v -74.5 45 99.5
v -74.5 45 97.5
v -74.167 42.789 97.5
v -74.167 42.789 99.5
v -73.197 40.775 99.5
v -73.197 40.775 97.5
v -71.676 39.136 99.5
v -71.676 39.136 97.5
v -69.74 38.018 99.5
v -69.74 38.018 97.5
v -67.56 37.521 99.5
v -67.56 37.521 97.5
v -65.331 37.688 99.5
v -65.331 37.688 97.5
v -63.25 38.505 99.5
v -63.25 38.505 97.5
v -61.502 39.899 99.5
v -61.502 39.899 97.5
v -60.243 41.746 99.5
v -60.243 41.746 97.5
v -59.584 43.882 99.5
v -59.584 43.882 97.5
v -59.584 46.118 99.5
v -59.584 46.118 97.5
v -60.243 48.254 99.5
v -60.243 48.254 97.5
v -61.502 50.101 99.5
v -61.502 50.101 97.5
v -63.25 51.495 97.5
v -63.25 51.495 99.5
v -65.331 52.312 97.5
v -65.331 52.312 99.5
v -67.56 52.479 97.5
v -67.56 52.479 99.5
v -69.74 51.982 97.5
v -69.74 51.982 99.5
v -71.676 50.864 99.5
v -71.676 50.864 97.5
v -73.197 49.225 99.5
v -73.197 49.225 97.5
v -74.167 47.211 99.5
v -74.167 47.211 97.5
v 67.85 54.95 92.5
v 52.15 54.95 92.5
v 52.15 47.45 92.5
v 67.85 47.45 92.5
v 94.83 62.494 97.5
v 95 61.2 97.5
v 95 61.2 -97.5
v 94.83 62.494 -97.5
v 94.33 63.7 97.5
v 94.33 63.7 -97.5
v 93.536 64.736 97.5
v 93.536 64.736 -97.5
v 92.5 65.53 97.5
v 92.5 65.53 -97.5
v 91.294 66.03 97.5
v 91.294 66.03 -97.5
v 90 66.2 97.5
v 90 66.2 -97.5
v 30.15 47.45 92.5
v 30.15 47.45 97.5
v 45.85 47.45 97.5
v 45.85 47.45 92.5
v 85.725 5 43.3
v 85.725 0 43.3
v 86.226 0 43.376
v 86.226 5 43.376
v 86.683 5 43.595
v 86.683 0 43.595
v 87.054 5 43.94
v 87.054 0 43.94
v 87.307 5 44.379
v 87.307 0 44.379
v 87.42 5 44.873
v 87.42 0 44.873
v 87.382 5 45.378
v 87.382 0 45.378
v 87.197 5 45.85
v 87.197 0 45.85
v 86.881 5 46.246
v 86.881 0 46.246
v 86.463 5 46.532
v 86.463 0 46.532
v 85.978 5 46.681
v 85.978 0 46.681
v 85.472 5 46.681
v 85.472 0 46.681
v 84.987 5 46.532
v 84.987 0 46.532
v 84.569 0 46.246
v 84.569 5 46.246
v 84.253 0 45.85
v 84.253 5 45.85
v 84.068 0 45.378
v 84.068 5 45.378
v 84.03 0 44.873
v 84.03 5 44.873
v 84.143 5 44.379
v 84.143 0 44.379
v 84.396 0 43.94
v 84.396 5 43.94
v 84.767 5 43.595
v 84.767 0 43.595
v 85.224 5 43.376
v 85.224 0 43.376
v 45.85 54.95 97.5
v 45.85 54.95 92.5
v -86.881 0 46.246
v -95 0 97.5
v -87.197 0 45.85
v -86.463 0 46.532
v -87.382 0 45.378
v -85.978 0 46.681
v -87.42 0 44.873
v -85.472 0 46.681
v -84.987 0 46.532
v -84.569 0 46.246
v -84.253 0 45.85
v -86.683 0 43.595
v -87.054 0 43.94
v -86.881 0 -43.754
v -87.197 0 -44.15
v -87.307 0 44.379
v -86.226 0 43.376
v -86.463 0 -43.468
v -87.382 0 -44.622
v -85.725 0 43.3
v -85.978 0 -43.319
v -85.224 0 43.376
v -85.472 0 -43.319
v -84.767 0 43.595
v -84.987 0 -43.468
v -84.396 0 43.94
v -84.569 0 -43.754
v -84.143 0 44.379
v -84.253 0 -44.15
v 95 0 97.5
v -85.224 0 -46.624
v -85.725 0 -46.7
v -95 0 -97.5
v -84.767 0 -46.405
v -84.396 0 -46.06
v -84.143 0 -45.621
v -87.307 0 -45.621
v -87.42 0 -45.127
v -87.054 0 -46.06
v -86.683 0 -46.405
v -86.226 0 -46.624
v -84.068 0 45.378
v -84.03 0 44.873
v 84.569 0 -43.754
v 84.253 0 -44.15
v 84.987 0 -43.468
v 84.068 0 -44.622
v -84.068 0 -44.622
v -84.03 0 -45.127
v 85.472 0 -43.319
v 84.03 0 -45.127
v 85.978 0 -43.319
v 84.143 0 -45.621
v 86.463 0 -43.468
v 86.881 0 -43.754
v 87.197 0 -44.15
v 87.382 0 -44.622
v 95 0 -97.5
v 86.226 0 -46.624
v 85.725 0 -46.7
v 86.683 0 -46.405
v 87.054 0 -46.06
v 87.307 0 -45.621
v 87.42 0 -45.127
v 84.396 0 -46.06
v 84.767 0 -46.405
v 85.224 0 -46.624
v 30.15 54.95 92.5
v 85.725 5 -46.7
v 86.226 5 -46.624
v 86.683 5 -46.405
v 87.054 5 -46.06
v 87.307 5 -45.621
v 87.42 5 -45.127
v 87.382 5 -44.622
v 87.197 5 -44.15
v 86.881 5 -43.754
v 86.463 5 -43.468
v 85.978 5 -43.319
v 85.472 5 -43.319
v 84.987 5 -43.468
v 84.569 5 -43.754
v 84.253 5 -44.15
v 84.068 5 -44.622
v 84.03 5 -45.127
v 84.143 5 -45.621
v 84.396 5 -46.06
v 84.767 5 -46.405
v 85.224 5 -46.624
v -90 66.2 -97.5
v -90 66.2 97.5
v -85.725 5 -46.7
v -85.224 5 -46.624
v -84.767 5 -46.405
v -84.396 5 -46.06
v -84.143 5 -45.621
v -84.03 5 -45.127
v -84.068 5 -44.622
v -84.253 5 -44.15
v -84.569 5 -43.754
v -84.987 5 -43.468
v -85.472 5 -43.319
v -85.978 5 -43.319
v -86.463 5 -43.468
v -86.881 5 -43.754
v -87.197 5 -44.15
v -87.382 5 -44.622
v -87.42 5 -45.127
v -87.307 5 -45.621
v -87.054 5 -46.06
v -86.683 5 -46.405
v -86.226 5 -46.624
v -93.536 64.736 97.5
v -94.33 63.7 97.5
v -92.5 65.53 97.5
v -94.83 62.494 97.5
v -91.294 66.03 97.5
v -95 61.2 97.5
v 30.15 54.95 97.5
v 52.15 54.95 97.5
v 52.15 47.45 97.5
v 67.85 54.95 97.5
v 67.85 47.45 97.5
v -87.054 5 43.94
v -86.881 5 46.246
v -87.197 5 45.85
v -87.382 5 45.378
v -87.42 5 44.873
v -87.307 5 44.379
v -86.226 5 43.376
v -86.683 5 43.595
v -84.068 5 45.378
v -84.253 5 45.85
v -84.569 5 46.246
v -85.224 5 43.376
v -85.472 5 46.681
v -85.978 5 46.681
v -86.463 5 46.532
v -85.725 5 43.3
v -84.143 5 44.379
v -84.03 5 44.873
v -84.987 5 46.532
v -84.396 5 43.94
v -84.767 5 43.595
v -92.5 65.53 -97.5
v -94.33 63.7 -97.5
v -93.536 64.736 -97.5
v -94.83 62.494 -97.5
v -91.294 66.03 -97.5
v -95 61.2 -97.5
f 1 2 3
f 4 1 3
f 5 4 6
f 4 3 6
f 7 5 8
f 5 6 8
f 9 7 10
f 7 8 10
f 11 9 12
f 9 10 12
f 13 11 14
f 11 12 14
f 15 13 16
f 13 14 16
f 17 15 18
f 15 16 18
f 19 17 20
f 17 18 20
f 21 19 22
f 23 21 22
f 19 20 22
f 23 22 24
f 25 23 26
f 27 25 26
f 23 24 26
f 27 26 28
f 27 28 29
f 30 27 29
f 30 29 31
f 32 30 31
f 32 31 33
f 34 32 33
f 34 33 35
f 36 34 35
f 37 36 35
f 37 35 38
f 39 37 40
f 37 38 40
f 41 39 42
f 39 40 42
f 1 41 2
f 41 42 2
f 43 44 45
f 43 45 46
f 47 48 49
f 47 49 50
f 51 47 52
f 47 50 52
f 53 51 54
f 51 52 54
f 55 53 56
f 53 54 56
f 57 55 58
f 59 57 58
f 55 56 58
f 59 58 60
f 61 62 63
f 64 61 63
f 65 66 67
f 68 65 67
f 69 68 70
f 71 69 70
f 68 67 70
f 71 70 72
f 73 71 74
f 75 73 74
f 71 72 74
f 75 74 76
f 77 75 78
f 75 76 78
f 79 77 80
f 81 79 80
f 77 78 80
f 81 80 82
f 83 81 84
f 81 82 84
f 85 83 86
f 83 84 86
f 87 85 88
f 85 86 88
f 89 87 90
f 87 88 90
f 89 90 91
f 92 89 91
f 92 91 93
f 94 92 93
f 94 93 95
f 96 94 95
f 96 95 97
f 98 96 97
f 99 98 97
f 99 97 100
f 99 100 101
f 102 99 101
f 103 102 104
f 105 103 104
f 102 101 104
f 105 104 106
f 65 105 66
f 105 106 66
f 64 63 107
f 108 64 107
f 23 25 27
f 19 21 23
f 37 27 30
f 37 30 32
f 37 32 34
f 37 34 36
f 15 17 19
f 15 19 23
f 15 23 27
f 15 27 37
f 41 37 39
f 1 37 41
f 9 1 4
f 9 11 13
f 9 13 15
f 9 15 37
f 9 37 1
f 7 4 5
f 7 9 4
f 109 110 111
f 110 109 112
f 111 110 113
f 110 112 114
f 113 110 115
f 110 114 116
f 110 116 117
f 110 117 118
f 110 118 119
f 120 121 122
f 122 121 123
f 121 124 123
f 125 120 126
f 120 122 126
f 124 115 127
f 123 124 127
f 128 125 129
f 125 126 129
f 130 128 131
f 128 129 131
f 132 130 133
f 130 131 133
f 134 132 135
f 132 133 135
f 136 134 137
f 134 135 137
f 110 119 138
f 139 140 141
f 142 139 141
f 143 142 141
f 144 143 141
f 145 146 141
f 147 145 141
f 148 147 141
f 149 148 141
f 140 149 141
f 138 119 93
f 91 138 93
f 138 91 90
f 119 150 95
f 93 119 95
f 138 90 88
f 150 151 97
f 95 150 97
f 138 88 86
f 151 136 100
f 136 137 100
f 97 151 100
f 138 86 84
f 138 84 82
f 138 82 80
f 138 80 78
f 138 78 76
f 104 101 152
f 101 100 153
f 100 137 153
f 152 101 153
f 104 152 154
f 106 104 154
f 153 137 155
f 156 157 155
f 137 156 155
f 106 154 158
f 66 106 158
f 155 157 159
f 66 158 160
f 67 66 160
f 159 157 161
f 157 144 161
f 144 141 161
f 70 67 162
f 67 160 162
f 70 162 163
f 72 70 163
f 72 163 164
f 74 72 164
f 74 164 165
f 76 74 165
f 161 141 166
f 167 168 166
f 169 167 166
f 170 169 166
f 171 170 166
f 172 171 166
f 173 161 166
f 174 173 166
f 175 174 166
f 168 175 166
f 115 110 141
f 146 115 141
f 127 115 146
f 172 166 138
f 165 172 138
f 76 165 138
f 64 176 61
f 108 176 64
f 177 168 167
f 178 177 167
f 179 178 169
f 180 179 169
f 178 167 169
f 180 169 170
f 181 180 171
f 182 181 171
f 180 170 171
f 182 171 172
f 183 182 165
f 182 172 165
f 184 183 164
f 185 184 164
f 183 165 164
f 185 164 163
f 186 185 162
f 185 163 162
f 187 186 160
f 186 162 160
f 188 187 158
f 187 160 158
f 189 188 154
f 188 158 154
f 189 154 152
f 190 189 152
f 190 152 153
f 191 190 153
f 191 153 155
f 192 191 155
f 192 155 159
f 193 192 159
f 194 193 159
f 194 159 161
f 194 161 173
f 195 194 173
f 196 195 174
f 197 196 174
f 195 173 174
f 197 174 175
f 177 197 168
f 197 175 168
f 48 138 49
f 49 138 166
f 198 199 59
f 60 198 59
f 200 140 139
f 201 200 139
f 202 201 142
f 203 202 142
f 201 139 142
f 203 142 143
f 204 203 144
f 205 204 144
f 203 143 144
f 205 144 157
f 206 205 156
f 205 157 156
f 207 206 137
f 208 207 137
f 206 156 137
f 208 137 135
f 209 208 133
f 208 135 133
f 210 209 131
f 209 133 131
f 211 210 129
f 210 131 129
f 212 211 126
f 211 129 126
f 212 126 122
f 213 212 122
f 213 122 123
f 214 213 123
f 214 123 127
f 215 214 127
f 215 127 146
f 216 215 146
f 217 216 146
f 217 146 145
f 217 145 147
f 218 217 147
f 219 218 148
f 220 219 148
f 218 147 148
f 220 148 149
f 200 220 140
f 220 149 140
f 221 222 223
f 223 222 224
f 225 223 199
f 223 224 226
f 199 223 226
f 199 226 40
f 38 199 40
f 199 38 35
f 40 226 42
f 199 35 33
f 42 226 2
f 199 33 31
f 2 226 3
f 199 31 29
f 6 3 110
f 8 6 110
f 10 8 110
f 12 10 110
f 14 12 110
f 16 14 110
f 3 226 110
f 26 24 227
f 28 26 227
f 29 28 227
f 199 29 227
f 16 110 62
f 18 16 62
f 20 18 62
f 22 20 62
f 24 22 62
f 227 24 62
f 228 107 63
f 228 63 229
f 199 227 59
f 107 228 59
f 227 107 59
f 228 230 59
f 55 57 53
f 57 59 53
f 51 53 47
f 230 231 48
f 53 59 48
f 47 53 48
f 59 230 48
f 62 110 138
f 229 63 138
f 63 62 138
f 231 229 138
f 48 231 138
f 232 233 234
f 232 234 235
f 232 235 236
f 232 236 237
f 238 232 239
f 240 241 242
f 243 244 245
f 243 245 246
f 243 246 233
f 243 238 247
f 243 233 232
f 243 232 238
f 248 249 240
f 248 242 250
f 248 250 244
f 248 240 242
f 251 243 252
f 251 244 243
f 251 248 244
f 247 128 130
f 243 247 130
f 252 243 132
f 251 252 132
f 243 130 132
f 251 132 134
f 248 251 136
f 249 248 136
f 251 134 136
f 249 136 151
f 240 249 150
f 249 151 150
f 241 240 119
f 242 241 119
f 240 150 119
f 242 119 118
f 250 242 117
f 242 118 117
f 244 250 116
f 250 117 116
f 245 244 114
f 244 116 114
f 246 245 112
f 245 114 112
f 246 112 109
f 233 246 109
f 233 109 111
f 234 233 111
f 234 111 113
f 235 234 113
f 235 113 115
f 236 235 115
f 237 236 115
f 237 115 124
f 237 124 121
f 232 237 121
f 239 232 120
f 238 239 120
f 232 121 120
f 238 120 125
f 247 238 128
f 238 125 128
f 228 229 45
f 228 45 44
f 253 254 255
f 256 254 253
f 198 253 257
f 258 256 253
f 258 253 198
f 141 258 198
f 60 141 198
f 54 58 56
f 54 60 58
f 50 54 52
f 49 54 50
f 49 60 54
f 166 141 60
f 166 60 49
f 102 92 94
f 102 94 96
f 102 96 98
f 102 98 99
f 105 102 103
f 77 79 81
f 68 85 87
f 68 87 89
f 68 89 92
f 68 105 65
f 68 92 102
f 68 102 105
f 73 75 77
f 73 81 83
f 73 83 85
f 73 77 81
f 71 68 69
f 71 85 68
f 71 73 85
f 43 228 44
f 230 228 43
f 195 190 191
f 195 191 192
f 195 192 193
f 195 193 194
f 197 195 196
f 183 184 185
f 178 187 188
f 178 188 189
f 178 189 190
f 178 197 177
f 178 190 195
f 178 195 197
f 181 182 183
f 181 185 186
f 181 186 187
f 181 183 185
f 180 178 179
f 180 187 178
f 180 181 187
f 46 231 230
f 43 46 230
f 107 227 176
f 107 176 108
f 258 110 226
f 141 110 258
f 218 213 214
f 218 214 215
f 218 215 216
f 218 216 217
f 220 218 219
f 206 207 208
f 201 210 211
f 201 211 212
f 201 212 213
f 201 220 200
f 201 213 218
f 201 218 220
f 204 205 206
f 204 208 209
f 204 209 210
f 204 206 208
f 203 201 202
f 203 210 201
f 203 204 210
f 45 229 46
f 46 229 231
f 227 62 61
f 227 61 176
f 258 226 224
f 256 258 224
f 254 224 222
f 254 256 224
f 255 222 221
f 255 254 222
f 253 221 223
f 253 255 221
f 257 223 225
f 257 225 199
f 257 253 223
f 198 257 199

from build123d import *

# Parameters (mm, degrees)
SKETCH1_W           = 190
SKETCH1_H           = 195
BOSS_EXTRUDE1_DEPTH = 66.2
FILLET1_R           = 5
SKETCH2_R           = 1.7
CUT_EXTRUDE1_DEPTH  = 5
SKETCH3_R           = 7.5
BOSS_EXTRUDE2_DEPTH = 2
SKETCH4_W           = 15.7
SKETCH4_H           = 7.5
CUT_EXTRUDE2_DEPTH  = 5


with BuildPart() as part:
    # Sketch1 → Boss-Extrude1 (new body)
    with BuildSketch(Plane(origin=(0, 0, 0), x_dir=(1, 0, 0), z_dir=(0, 1, 0))):
        Rectangle(SKETCH1_W, SKETCH1_H)
    extrude(amount=BOSS_EXTRUDE1_DEPTH)

    # Fillet1
    fillet1_edges = [part.edges().sort_by_distance(p)[0] for p in [
        (-95, 66.2, 0),
        (95, 66.2, 0),
    ]]
    fillet(fillet1_edges, radius=FILLET1_R)

    # Sketch2 → Cut-Extrude1 (cut)
    with BuildSketch(Plane(origin=(0, 0, 0), x_dir=(-1, 0, 0), z_dir=(0, -1, 0))):
        with Locations(Location((85.725, -45, 0), (0, 0, 90))):
            Circle(SKETCH2_R)
        with Locations(Location((-85.725, -45, 0), (0, 0, 90))):
            Circle(SKETCH2_R)
        with Locations(Location((-85.725, 45, 0), (0, 0, 90))):
            Circle(SKETCH2_R)
        with Locations(Location((85.725, 45, 0), (0, 0, 90))):
            Circle(SKETCH2_R)
    extrude(amount=-CUT_EXTRUDE1_DEPTH, mode=Mode.SUBTRACT)

    # Sketch3 → Boss-Extrude2 (add)
    with BuildSketch(Plane.XY.offset(97.5)):
        with Locations(Location((-67, 45, 0), (0, 0, 180))):
            Circle(SKETCH3_R)
    extrude(amount=BOSS_EXTRUDE2_DEPTH)

    # Sketch4 → Cut-Extrude2 (cut)
    with BuildSketch(Plane.XY.offset(97.5)):
        with Locations((38, 51.2)):
            Rectangle(SKETCH4_W, SKETCH4_H)
        with Locations((60, 51.2)):
            Rectangle(SKETCH4_W, SKETCH4_H)
    extrude(amount=-CUT_EXTRUDE2_DEPTH, mode=Mode.SUBTRACT)


solid = part.part
